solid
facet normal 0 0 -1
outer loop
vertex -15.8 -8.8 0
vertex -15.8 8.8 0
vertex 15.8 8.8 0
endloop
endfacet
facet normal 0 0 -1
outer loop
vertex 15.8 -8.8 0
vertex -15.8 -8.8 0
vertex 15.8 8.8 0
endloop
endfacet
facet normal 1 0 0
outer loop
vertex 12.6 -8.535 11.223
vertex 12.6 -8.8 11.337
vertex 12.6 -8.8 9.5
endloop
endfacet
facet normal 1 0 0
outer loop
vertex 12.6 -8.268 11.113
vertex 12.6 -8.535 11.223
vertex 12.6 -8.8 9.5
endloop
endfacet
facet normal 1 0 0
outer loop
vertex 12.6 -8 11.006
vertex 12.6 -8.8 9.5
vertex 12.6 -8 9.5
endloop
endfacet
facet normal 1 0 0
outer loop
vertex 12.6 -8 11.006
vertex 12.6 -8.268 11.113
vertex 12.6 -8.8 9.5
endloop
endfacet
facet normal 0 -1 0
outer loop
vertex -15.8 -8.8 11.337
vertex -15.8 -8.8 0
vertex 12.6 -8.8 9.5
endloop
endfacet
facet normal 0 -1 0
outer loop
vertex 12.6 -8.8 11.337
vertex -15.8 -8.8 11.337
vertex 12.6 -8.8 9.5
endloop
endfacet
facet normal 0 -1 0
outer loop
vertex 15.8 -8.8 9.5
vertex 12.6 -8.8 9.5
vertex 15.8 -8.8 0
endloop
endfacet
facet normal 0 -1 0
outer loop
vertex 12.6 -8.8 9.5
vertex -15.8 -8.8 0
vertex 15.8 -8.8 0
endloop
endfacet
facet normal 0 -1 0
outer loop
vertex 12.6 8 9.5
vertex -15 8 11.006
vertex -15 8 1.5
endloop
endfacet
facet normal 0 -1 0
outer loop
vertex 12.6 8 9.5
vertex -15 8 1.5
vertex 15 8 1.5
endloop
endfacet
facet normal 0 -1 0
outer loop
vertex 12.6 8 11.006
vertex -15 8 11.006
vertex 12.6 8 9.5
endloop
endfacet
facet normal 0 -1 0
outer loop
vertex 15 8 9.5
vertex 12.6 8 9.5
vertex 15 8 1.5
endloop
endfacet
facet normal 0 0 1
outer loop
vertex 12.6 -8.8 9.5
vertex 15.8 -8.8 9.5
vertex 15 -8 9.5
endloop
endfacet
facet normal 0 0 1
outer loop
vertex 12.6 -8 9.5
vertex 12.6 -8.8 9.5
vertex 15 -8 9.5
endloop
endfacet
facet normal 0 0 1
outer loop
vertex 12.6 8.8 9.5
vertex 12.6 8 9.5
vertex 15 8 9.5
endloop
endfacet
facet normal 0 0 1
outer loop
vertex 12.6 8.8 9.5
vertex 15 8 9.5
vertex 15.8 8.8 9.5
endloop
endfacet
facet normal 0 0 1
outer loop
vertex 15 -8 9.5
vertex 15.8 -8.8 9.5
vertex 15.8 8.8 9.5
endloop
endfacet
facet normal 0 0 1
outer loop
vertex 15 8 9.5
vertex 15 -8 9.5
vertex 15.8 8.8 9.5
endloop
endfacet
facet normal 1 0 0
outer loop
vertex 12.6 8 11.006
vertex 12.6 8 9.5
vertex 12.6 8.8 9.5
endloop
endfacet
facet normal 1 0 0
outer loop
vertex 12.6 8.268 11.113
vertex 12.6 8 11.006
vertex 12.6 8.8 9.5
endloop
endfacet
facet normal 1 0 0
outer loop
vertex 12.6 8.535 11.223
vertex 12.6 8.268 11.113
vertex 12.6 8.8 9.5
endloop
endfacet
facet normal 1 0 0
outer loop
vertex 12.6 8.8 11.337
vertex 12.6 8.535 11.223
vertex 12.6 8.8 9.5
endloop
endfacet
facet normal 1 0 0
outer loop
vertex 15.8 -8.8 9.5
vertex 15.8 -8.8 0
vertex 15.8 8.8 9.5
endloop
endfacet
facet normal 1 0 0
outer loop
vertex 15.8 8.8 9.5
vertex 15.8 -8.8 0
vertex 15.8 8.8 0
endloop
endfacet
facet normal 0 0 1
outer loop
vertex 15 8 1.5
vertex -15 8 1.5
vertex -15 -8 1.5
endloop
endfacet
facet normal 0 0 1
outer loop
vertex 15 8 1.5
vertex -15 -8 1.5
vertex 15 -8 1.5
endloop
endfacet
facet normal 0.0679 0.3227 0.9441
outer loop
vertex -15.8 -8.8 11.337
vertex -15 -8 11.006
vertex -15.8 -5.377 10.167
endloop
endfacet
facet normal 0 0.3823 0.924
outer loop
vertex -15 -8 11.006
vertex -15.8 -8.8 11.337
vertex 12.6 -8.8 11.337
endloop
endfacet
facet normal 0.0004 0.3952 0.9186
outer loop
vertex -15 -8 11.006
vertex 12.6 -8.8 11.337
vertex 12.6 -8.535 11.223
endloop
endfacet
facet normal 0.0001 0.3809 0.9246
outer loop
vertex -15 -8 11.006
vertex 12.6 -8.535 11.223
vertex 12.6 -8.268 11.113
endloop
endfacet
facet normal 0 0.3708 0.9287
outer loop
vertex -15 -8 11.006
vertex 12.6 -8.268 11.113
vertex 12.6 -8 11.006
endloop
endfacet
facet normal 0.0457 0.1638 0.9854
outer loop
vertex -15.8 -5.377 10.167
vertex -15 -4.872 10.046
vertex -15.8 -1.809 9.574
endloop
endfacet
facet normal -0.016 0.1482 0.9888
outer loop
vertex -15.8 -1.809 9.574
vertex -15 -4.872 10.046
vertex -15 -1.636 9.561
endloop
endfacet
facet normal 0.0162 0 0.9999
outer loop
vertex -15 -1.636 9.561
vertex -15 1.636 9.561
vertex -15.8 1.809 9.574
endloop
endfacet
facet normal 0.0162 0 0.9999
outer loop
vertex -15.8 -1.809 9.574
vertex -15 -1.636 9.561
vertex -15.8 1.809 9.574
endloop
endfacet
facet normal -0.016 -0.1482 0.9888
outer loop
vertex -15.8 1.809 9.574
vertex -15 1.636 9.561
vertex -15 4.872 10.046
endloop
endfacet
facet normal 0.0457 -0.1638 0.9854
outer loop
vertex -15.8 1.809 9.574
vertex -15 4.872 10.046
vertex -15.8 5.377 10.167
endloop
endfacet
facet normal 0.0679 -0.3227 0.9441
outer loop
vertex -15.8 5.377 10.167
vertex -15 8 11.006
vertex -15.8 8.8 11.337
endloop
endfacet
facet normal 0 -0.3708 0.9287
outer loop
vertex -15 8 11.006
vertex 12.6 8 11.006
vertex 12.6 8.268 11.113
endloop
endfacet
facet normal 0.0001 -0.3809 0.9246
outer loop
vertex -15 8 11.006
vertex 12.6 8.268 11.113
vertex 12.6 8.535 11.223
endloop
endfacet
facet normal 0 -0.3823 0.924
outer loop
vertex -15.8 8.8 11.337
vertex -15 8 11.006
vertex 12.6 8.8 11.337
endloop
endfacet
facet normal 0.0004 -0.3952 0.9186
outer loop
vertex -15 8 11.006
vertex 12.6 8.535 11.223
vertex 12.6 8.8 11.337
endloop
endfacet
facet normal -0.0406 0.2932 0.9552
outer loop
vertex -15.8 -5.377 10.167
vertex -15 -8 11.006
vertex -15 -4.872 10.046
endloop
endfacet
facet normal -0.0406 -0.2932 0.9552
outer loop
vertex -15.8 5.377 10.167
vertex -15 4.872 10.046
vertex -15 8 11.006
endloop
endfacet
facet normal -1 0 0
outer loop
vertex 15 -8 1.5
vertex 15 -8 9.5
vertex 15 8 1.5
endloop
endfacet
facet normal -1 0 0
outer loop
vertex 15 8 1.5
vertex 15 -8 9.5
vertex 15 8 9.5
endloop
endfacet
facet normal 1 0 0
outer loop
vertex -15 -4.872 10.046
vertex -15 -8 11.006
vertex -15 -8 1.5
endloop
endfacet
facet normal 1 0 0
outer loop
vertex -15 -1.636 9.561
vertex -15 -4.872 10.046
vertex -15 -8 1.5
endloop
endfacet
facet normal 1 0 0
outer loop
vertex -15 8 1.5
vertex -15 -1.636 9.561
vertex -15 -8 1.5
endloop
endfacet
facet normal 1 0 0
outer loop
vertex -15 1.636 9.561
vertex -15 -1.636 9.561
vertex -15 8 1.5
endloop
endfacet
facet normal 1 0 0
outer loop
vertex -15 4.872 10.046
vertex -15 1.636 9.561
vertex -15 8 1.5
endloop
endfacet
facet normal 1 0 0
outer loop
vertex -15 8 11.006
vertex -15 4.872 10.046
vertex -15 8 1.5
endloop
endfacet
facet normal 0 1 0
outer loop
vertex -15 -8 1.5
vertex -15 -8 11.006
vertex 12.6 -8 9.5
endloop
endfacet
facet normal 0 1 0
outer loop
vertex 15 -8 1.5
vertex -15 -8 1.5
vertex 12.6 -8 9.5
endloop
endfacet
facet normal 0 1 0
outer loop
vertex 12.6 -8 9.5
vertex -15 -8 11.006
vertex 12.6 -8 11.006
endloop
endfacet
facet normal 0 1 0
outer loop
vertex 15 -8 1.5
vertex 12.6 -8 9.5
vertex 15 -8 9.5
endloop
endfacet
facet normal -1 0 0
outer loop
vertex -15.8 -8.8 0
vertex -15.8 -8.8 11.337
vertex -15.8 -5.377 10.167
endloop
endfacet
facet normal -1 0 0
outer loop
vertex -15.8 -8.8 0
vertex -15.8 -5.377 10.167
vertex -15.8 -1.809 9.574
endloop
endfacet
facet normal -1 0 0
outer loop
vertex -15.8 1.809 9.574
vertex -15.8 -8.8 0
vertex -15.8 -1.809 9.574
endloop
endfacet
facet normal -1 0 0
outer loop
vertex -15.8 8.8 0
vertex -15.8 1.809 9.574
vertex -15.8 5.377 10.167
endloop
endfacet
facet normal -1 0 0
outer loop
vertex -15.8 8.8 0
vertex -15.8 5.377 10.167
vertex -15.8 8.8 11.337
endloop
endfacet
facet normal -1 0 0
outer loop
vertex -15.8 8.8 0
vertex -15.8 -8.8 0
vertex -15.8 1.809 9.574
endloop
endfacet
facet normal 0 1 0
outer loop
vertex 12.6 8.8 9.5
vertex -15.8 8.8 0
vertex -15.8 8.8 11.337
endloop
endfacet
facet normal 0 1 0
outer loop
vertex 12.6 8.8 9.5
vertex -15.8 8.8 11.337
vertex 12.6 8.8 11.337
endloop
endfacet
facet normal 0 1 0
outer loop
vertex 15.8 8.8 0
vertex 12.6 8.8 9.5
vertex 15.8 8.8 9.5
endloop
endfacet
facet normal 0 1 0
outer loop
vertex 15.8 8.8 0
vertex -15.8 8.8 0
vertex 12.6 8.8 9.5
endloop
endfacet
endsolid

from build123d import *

# Parameters (mm, degrees)
F0_W          = 31.6
F0_H          = 17.6
F1_DEPTH      = 25
F2_W          = 30
F2_H          = 16
F3_DEPTH      = 23.5
F4_R          = 22
F5_DEPTH      = 12.6
F5_DEPTH_BACK = 15.801
F6_W          = 25
F6_H          = 50
F7_DEPTH      = 3.2


with BuildPart() as f1:
    # F0 (on Top) → F1 (new body)
    with BuildSketch(Plane.XY):
        Rectangle(F0_W, F0_H)
    extrude(amount=F1_DEPTH)

    # F2 (on face) → F3 (cut)
    with BuildSketch(Plane.XY.offset(25)):
        Rectangle(F2_W, F2_H)
    extrude(amount=-F3_DEPTH, mode=Mode.SUBTRACT)

    # F4 (on Right) → F5 (cut, two sides)
    with BuildSketch(Plane.YZ) as f5_sk:
        with Locations((0, 31.5)):
            Circle(F4_R)
    extrude(amount=F5_DEPTH, mode=Mode.SUBTRACT)
    extrude(f5_sk.sketch, amount=-F5_DEPTH_BACK, mode=Mode.SUBTRACT)

    # F6 (on face) → F7 (cut)
    with BuildSketch(Plane.YZ.offset(15.8)):
        with Locations((0, 34.5)):
            Rectangle(F6_W, F6_H)
    extrude(amount=-F7_DEPTH, mode=Mode.SUBTRACT)


solid = f1.part
